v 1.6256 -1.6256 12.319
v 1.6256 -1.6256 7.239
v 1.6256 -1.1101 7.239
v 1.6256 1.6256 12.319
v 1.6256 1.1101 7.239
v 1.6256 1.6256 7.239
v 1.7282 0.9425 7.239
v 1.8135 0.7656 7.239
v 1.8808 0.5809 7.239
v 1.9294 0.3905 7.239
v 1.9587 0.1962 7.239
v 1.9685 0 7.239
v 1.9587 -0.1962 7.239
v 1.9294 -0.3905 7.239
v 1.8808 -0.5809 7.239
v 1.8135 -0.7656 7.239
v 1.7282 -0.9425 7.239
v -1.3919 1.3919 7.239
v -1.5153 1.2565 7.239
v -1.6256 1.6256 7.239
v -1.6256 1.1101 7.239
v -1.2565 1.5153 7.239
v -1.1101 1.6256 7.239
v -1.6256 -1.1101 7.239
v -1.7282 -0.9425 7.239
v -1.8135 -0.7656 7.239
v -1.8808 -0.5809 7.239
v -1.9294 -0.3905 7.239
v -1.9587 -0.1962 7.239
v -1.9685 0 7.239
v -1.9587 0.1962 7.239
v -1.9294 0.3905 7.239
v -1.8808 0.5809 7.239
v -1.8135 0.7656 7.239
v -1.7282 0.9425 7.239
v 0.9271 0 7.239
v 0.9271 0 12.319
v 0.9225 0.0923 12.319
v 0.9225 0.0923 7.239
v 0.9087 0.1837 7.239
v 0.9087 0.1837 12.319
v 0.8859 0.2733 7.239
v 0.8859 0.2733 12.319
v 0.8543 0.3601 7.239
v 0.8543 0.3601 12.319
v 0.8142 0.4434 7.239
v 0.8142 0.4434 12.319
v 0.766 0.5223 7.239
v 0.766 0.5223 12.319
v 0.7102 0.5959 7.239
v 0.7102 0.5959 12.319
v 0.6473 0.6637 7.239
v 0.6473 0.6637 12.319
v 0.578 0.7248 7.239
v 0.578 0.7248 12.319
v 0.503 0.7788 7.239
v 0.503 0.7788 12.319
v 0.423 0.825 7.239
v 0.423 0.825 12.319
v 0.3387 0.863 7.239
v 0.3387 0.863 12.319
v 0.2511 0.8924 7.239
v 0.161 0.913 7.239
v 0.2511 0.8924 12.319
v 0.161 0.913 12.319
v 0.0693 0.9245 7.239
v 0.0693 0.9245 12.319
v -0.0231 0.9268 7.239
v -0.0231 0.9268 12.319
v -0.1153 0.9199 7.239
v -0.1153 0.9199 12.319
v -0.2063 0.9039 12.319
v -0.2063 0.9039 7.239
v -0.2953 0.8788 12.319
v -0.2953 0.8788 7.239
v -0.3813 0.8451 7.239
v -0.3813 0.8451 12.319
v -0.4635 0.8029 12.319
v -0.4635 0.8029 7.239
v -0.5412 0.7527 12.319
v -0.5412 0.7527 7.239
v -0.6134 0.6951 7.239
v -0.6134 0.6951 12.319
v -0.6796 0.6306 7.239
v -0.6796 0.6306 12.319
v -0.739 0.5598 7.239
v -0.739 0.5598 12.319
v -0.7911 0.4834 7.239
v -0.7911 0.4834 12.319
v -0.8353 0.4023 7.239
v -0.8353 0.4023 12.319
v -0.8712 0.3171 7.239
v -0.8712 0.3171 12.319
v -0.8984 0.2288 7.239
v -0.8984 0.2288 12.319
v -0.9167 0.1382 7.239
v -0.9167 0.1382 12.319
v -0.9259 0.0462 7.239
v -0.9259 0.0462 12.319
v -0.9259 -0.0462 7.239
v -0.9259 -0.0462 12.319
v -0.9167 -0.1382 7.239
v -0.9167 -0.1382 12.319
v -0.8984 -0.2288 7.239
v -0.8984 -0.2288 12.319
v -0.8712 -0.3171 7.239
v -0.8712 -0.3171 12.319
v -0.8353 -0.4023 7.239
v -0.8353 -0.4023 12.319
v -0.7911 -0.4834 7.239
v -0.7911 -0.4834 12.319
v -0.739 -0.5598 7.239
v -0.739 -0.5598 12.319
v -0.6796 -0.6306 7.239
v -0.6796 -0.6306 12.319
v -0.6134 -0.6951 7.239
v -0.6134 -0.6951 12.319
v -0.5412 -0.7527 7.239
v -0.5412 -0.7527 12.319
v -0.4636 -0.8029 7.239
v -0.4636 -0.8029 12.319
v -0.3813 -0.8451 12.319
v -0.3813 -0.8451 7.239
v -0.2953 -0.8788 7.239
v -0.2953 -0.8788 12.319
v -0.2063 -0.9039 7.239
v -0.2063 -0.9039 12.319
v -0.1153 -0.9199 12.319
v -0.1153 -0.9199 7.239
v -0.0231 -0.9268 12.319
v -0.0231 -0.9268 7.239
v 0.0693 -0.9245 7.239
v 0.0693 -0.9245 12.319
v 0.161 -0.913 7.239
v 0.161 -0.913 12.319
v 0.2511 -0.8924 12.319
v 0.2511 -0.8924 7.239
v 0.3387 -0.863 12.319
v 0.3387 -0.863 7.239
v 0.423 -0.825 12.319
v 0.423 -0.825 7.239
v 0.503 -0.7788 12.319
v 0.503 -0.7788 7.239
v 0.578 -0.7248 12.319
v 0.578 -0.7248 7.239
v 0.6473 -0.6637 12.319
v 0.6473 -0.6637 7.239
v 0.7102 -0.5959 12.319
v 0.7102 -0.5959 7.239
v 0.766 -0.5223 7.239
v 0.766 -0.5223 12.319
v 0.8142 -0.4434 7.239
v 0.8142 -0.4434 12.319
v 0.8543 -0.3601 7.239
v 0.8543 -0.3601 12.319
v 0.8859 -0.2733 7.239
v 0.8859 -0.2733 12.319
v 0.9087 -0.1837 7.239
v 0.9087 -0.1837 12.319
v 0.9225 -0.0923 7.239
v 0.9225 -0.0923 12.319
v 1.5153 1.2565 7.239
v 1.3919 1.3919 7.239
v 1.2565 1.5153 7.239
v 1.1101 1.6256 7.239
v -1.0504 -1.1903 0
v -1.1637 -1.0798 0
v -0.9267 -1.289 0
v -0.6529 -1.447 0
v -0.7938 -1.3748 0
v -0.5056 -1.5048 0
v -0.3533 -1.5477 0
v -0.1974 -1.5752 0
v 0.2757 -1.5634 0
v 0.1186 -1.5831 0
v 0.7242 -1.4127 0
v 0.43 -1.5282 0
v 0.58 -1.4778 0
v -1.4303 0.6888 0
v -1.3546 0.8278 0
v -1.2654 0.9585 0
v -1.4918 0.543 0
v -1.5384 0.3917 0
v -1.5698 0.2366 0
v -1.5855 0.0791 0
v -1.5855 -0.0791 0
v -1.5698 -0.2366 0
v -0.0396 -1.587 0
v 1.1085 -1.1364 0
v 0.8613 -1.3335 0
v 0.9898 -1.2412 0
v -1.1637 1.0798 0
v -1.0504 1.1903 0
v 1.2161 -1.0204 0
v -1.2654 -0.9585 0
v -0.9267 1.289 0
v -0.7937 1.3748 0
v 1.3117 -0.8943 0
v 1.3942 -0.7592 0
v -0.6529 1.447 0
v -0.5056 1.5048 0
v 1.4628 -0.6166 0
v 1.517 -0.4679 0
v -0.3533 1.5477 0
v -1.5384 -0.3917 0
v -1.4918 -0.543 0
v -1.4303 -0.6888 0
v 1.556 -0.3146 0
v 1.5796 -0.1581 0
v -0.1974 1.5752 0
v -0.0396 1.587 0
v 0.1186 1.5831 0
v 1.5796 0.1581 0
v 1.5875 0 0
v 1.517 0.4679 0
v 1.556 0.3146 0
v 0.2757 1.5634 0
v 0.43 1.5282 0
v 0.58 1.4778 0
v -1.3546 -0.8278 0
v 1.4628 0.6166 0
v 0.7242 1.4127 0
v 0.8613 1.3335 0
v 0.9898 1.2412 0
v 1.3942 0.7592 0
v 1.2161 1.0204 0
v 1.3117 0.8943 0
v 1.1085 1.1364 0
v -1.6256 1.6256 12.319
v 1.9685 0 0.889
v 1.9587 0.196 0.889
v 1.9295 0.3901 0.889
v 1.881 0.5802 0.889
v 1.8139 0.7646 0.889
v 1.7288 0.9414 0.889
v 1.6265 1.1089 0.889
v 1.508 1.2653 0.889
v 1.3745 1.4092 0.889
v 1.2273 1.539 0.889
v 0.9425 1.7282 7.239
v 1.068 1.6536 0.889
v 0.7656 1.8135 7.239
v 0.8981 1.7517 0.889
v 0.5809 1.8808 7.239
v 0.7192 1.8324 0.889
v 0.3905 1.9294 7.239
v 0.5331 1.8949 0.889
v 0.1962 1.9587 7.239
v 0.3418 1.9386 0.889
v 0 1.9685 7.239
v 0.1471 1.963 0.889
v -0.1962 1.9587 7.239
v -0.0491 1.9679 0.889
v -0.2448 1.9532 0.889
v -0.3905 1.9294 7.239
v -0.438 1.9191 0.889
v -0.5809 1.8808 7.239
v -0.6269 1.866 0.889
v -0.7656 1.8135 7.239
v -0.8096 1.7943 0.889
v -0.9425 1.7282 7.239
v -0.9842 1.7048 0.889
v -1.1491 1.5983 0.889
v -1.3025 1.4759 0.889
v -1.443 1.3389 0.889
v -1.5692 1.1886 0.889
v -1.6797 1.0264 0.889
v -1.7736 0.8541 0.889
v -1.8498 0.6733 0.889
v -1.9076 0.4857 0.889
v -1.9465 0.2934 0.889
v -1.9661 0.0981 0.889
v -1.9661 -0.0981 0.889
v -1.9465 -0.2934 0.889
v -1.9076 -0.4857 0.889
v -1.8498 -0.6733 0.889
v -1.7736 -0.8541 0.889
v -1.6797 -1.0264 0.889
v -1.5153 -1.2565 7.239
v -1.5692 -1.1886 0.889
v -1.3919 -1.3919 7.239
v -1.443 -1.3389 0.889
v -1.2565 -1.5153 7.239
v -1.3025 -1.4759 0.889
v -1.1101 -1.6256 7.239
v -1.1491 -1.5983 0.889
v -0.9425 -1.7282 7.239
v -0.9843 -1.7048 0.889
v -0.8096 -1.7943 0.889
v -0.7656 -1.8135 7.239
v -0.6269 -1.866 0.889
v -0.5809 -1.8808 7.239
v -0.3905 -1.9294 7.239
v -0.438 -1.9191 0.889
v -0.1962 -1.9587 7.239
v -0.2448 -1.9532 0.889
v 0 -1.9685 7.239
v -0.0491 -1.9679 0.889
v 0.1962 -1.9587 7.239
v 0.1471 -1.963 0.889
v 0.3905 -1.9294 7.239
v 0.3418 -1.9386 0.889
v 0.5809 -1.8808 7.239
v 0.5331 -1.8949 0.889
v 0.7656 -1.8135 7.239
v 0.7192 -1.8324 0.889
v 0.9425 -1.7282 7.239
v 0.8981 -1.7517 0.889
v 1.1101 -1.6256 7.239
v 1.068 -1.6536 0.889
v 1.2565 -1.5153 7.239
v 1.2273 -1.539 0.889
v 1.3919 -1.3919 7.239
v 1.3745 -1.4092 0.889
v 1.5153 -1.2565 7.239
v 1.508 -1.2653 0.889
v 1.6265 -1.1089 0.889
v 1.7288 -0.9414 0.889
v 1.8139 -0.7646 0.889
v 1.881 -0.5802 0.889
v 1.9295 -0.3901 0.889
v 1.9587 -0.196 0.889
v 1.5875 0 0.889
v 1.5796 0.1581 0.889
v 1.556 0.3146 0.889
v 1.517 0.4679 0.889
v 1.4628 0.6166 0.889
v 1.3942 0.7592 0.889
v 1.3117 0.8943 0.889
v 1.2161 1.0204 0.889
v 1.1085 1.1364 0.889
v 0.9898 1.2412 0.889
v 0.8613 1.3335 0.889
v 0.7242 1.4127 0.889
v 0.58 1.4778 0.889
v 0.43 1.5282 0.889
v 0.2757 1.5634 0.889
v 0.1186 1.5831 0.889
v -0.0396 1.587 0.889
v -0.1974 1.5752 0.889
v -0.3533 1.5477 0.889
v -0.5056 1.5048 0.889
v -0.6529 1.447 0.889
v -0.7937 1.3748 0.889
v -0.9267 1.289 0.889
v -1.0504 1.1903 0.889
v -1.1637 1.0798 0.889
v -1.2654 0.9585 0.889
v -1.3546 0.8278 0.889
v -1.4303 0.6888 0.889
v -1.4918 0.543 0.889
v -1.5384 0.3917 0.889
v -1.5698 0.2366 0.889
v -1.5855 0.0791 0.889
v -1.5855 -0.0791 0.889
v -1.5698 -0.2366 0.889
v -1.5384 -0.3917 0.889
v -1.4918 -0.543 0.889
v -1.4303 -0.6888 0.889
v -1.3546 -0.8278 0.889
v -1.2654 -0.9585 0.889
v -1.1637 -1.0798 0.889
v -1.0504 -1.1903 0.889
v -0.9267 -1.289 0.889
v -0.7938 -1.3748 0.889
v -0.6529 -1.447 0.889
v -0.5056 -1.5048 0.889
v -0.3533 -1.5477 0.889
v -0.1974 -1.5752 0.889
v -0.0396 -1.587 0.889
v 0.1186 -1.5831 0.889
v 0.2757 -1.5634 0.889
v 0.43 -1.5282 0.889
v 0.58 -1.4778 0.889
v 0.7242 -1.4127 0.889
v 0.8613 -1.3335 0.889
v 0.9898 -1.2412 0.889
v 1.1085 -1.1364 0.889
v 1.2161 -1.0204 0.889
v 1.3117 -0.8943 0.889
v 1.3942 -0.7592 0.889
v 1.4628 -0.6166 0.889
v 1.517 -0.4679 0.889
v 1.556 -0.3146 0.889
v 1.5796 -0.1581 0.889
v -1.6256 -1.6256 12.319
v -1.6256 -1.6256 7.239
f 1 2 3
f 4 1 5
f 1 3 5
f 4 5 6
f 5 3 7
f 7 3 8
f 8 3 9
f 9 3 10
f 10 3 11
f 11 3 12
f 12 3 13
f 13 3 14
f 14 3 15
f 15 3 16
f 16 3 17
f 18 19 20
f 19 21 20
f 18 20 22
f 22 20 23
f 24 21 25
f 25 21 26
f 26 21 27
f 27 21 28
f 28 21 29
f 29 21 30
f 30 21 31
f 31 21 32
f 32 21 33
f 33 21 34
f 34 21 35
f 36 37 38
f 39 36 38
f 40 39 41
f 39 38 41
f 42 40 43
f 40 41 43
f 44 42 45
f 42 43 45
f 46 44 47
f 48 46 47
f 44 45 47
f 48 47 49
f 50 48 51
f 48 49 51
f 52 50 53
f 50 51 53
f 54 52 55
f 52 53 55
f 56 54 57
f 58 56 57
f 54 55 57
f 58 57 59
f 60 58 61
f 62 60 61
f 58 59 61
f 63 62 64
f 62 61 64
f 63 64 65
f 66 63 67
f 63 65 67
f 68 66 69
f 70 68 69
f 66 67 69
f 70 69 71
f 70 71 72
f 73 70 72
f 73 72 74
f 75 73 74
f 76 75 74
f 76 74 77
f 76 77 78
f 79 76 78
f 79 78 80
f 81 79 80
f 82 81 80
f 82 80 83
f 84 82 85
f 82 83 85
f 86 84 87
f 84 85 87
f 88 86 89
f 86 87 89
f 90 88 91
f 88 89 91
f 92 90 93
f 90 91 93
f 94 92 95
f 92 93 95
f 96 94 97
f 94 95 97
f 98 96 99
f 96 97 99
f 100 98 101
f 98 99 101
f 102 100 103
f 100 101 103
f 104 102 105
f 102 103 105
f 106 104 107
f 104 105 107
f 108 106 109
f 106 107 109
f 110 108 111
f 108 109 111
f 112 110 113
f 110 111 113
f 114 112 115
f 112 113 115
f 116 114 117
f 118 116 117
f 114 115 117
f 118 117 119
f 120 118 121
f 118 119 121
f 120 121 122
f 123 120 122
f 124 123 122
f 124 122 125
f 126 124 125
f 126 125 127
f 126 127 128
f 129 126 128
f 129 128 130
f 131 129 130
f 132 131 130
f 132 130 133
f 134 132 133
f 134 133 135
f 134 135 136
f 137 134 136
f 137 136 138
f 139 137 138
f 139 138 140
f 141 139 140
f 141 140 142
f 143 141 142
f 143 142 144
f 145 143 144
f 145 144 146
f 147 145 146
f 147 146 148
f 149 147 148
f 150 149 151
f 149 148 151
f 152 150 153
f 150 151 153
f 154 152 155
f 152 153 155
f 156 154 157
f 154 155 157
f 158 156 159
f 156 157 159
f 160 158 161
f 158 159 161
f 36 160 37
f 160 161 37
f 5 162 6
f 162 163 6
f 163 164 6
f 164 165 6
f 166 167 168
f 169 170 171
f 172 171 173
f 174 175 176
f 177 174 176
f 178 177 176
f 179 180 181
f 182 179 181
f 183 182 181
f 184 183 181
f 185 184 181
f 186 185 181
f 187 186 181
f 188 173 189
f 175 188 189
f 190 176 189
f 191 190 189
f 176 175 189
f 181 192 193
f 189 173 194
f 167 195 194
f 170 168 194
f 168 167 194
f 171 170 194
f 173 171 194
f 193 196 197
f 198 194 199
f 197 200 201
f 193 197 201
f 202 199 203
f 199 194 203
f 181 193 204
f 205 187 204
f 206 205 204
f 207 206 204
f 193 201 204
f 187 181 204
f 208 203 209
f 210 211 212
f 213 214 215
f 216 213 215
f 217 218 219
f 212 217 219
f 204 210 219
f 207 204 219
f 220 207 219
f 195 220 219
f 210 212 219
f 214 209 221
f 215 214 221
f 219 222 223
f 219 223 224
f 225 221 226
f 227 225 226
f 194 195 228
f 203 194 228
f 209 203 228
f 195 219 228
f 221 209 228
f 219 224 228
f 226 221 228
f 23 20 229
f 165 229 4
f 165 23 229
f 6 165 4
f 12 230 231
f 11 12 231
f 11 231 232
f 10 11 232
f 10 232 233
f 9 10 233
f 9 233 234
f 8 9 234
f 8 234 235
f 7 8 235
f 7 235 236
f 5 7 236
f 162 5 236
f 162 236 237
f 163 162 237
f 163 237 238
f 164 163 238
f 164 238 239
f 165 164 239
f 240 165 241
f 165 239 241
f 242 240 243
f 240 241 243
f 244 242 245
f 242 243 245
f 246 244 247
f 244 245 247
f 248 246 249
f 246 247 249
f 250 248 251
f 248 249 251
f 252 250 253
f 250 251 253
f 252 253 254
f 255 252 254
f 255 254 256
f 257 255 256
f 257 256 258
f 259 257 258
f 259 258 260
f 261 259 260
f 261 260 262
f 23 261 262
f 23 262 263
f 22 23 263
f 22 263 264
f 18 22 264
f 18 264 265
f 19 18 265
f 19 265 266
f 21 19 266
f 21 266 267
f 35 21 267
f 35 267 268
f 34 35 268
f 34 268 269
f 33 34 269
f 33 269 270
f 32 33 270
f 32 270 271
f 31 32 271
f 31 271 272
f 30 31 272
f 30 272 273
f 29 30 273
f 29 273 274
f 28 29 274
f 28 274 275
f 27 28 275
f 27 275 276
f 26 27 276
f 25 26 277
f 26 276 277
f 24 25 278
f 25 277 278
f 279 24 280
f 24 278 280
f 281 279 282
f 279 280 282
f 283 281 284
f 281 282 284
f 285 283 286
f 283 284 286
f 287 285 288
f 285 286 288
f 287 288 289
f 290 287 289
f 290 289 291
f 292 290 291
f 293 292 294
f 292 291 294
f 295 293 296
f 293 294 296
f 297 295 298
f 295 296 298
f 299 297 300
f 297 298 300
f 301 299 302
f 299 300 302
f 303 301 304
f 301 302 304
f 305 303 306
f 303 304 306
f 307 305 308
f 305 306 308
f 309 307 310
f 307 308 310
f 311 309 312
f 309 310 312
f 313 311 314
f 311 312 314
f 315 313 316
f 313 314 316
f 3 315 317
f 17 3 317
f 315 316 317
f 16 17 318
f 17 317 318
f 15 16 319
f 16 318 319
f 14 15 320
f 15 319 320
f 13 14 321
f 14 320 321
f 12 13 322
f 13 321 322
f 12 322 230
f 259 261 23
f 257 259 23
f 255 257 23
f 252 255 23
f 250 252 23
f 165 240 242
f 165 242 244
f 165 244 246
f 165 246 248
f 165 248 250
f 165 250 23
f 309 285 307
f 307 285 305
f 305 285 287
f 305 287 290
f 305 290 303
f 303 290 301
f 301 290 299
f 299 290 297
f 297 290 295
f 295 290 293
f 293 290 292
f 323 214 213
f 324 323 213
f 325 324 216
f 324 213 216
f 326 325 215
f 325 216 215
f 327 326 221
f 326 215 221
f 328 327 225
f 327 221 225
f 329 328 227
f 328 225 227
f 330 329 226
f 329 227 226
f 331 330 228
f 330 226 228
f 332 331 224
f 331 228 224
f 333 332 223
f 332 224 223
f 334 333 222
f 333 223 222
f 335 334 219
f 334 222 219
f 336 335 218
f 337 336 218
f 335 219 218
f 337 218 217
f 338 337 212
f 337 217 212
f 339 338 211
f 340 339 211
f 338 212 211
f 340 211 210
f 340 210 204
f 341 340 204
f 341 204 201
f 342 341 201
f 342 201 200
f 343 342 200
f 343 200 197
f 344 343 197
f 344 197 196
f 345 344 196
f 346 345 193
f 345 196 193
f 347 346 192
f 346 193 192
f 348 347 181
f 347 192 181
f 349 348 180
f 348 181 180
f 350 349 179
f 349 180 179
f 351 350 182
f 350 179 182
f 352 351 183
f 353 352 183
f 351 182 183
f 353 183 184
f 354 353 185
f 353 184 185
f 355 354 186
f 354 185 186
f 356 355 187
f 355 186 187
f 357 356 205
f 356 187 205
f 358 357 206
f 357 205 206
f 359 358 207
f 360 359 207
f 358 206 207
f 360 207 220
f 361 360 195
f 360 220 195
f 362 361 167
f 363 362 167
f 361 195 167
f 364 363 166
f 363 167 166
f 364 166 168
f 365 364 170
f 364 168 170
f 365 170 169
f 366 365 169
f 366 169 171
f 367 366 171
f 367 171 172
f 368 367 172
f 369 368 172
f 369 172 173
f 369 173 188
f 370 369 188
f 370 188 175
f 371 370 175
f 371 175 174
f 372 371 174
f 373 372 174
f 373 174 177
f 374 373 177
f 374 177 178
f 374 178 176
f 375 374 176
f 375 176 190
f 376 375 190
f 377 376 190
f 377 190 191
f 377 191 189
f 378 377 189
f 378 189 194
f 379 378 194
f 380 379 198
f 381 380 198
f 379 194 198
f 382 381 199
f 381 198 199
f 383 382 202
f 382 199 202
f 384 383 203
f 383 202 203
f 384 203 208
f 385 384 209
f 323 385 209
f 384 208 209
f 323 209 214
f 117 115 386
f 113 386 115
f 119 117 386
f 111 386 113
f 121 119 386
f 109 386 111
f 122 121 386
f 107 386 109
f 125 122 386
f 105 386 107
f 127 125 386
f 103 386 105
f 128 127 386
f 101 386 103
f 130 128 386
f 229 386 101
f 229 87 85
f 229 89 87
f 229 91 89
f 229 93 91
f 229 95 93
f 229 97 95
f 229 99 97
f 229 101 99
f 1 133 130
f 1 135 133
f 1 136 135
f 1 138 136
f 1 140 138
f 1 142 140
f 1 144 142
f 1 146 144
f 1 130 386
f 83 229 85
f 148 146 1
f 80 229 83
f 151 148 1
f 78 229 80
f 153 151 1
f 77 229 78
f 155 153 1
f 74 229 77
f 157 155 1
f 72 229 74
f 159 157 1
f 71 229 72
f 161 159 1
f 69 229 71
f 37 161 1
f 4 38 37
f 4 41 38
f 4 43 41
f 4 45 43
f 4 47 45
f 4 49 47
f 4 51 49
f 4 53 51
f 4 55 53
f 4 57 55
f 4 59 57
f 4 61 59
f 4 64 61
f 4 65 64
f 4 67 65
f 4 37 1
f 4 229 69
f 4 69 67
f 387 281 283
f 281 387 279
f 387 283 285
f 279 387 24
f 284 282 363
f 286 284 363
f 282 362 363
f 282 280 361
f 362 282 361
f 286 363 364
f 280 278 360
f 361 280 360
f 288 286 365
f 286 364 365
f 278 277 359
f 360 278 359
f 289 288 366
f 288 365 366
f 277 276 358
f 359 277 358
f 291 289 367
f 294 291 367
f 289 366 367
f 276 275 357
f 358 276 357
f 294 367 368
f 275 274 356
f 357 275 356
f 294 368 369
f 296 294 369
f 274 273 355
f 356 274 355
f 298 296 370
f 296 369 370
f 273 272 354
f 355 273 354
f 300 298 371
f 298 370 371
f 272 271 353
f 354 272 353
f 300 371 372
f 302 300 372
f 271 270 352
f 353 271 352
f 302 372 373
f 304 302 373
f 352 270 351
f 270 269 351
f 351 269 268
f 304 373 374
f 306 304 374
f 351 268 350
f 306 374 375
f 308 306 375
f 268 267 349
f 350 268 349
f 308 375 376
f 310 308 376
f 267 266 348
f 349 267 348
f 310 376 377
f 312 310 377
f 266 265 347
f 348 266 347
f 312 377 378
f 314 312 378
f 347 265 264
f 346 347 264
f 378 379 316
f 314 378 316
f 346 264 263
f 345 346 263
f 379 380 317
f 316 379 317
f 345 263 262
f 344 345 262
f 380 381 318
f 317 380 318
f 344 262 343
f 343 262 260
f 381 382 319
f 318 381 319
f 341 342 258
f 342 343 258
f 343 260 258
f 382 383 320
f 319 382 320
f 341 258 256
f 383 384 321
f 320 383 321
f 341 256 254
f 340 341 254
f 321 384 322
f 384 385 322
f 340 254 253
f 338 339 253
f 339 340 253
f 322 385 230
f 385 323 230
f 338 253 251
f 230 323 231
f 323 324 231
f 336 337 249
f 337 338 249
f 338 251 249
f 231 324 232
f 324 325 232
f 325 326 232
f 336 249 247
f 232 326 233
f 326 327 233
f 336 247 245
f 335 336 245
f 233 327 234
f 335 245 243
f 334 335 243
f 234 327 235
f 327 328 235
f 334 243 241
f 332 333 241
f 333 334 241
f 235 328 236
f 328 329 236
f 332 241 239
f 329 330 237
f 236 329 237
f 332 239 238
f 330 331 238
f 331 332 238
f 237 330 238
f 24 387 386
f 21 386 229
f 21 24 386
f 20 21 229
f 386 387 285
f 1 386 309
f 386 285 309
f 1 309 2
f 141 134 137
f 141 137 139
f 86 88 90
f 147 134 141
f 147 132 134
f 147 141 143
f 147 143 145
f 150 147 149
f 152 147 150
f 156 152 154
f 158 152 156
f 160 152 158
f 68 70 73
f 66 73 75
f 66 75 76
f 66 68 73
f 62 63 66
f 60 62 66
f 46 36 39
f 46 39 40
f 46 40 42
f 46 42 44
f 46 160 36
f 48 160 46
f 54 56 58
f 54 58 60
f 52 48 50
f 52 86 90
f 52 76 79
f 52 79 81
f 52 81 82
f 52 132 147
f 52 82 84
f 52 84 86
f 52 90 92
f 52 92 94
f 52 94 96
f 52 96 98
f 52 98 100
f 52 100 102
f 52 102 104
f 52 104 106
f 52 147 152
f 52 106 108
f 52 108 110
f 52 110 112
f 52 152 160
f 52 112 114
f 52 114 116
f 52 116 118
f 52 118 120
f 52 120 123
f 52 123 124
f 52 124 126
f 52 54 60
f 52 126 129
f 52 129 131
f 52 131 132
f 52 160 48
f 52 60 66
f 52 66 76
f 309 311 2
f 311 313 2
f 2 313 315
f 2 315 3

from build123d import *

# Parameters (mm, degrees)
SKETCH1_R           = 1.5875
BOSS_EXTRUDE1_DEPTH = 0.889
SKETCH2_R           = 1.9685
BOSS_EXTRUDE2_DEPTH = 6.35
SKETCH4_W           = 3.2512
SKETCH4_H           = 3.2512
BOSS_EXTRUDE3_DEPTH = 5.08
SKETCH5_R           = 0.9271
CUT_EXTRUDE1_DEPTH  = 5.08


with BuildPart() as part:
    # Sketch1 → Boss-Extrude1 (new body)
    with BuildSketch(Plane.XY):
        Circle(SKETCH1_R)
    extrude(amount=BOSS_EXTRUDE1_DEPTH)

    # Sketch2 → Boss-Extrude2 (add)
    with BuildSketch(Plane.XY.offset(0.889)):
        Circle(SKETCH2_R)
    extrude(amount=BOSS_EXTRUDE2_DEPTH)

    # Sketch4 → Boss-Extrude3 (add)
    with BuildSketch(Plane.XY.offset(7.239)):
        Rectangle(SKETCH4_W, SKETCH4_H)
    extrude(amount=BOSS_EXTRUDE3_DEPTH)

    # Sketch5 → Cut-Extrude1 (cut)
    with BuildSketch(Plane.XY.offset(12.319)):
        Circle(SKETCH5_R)
    extrude(amount=-CUT_EXTRUDE1_DEPTH, mode=Mode.SUBTRACT)


solid = part.part
